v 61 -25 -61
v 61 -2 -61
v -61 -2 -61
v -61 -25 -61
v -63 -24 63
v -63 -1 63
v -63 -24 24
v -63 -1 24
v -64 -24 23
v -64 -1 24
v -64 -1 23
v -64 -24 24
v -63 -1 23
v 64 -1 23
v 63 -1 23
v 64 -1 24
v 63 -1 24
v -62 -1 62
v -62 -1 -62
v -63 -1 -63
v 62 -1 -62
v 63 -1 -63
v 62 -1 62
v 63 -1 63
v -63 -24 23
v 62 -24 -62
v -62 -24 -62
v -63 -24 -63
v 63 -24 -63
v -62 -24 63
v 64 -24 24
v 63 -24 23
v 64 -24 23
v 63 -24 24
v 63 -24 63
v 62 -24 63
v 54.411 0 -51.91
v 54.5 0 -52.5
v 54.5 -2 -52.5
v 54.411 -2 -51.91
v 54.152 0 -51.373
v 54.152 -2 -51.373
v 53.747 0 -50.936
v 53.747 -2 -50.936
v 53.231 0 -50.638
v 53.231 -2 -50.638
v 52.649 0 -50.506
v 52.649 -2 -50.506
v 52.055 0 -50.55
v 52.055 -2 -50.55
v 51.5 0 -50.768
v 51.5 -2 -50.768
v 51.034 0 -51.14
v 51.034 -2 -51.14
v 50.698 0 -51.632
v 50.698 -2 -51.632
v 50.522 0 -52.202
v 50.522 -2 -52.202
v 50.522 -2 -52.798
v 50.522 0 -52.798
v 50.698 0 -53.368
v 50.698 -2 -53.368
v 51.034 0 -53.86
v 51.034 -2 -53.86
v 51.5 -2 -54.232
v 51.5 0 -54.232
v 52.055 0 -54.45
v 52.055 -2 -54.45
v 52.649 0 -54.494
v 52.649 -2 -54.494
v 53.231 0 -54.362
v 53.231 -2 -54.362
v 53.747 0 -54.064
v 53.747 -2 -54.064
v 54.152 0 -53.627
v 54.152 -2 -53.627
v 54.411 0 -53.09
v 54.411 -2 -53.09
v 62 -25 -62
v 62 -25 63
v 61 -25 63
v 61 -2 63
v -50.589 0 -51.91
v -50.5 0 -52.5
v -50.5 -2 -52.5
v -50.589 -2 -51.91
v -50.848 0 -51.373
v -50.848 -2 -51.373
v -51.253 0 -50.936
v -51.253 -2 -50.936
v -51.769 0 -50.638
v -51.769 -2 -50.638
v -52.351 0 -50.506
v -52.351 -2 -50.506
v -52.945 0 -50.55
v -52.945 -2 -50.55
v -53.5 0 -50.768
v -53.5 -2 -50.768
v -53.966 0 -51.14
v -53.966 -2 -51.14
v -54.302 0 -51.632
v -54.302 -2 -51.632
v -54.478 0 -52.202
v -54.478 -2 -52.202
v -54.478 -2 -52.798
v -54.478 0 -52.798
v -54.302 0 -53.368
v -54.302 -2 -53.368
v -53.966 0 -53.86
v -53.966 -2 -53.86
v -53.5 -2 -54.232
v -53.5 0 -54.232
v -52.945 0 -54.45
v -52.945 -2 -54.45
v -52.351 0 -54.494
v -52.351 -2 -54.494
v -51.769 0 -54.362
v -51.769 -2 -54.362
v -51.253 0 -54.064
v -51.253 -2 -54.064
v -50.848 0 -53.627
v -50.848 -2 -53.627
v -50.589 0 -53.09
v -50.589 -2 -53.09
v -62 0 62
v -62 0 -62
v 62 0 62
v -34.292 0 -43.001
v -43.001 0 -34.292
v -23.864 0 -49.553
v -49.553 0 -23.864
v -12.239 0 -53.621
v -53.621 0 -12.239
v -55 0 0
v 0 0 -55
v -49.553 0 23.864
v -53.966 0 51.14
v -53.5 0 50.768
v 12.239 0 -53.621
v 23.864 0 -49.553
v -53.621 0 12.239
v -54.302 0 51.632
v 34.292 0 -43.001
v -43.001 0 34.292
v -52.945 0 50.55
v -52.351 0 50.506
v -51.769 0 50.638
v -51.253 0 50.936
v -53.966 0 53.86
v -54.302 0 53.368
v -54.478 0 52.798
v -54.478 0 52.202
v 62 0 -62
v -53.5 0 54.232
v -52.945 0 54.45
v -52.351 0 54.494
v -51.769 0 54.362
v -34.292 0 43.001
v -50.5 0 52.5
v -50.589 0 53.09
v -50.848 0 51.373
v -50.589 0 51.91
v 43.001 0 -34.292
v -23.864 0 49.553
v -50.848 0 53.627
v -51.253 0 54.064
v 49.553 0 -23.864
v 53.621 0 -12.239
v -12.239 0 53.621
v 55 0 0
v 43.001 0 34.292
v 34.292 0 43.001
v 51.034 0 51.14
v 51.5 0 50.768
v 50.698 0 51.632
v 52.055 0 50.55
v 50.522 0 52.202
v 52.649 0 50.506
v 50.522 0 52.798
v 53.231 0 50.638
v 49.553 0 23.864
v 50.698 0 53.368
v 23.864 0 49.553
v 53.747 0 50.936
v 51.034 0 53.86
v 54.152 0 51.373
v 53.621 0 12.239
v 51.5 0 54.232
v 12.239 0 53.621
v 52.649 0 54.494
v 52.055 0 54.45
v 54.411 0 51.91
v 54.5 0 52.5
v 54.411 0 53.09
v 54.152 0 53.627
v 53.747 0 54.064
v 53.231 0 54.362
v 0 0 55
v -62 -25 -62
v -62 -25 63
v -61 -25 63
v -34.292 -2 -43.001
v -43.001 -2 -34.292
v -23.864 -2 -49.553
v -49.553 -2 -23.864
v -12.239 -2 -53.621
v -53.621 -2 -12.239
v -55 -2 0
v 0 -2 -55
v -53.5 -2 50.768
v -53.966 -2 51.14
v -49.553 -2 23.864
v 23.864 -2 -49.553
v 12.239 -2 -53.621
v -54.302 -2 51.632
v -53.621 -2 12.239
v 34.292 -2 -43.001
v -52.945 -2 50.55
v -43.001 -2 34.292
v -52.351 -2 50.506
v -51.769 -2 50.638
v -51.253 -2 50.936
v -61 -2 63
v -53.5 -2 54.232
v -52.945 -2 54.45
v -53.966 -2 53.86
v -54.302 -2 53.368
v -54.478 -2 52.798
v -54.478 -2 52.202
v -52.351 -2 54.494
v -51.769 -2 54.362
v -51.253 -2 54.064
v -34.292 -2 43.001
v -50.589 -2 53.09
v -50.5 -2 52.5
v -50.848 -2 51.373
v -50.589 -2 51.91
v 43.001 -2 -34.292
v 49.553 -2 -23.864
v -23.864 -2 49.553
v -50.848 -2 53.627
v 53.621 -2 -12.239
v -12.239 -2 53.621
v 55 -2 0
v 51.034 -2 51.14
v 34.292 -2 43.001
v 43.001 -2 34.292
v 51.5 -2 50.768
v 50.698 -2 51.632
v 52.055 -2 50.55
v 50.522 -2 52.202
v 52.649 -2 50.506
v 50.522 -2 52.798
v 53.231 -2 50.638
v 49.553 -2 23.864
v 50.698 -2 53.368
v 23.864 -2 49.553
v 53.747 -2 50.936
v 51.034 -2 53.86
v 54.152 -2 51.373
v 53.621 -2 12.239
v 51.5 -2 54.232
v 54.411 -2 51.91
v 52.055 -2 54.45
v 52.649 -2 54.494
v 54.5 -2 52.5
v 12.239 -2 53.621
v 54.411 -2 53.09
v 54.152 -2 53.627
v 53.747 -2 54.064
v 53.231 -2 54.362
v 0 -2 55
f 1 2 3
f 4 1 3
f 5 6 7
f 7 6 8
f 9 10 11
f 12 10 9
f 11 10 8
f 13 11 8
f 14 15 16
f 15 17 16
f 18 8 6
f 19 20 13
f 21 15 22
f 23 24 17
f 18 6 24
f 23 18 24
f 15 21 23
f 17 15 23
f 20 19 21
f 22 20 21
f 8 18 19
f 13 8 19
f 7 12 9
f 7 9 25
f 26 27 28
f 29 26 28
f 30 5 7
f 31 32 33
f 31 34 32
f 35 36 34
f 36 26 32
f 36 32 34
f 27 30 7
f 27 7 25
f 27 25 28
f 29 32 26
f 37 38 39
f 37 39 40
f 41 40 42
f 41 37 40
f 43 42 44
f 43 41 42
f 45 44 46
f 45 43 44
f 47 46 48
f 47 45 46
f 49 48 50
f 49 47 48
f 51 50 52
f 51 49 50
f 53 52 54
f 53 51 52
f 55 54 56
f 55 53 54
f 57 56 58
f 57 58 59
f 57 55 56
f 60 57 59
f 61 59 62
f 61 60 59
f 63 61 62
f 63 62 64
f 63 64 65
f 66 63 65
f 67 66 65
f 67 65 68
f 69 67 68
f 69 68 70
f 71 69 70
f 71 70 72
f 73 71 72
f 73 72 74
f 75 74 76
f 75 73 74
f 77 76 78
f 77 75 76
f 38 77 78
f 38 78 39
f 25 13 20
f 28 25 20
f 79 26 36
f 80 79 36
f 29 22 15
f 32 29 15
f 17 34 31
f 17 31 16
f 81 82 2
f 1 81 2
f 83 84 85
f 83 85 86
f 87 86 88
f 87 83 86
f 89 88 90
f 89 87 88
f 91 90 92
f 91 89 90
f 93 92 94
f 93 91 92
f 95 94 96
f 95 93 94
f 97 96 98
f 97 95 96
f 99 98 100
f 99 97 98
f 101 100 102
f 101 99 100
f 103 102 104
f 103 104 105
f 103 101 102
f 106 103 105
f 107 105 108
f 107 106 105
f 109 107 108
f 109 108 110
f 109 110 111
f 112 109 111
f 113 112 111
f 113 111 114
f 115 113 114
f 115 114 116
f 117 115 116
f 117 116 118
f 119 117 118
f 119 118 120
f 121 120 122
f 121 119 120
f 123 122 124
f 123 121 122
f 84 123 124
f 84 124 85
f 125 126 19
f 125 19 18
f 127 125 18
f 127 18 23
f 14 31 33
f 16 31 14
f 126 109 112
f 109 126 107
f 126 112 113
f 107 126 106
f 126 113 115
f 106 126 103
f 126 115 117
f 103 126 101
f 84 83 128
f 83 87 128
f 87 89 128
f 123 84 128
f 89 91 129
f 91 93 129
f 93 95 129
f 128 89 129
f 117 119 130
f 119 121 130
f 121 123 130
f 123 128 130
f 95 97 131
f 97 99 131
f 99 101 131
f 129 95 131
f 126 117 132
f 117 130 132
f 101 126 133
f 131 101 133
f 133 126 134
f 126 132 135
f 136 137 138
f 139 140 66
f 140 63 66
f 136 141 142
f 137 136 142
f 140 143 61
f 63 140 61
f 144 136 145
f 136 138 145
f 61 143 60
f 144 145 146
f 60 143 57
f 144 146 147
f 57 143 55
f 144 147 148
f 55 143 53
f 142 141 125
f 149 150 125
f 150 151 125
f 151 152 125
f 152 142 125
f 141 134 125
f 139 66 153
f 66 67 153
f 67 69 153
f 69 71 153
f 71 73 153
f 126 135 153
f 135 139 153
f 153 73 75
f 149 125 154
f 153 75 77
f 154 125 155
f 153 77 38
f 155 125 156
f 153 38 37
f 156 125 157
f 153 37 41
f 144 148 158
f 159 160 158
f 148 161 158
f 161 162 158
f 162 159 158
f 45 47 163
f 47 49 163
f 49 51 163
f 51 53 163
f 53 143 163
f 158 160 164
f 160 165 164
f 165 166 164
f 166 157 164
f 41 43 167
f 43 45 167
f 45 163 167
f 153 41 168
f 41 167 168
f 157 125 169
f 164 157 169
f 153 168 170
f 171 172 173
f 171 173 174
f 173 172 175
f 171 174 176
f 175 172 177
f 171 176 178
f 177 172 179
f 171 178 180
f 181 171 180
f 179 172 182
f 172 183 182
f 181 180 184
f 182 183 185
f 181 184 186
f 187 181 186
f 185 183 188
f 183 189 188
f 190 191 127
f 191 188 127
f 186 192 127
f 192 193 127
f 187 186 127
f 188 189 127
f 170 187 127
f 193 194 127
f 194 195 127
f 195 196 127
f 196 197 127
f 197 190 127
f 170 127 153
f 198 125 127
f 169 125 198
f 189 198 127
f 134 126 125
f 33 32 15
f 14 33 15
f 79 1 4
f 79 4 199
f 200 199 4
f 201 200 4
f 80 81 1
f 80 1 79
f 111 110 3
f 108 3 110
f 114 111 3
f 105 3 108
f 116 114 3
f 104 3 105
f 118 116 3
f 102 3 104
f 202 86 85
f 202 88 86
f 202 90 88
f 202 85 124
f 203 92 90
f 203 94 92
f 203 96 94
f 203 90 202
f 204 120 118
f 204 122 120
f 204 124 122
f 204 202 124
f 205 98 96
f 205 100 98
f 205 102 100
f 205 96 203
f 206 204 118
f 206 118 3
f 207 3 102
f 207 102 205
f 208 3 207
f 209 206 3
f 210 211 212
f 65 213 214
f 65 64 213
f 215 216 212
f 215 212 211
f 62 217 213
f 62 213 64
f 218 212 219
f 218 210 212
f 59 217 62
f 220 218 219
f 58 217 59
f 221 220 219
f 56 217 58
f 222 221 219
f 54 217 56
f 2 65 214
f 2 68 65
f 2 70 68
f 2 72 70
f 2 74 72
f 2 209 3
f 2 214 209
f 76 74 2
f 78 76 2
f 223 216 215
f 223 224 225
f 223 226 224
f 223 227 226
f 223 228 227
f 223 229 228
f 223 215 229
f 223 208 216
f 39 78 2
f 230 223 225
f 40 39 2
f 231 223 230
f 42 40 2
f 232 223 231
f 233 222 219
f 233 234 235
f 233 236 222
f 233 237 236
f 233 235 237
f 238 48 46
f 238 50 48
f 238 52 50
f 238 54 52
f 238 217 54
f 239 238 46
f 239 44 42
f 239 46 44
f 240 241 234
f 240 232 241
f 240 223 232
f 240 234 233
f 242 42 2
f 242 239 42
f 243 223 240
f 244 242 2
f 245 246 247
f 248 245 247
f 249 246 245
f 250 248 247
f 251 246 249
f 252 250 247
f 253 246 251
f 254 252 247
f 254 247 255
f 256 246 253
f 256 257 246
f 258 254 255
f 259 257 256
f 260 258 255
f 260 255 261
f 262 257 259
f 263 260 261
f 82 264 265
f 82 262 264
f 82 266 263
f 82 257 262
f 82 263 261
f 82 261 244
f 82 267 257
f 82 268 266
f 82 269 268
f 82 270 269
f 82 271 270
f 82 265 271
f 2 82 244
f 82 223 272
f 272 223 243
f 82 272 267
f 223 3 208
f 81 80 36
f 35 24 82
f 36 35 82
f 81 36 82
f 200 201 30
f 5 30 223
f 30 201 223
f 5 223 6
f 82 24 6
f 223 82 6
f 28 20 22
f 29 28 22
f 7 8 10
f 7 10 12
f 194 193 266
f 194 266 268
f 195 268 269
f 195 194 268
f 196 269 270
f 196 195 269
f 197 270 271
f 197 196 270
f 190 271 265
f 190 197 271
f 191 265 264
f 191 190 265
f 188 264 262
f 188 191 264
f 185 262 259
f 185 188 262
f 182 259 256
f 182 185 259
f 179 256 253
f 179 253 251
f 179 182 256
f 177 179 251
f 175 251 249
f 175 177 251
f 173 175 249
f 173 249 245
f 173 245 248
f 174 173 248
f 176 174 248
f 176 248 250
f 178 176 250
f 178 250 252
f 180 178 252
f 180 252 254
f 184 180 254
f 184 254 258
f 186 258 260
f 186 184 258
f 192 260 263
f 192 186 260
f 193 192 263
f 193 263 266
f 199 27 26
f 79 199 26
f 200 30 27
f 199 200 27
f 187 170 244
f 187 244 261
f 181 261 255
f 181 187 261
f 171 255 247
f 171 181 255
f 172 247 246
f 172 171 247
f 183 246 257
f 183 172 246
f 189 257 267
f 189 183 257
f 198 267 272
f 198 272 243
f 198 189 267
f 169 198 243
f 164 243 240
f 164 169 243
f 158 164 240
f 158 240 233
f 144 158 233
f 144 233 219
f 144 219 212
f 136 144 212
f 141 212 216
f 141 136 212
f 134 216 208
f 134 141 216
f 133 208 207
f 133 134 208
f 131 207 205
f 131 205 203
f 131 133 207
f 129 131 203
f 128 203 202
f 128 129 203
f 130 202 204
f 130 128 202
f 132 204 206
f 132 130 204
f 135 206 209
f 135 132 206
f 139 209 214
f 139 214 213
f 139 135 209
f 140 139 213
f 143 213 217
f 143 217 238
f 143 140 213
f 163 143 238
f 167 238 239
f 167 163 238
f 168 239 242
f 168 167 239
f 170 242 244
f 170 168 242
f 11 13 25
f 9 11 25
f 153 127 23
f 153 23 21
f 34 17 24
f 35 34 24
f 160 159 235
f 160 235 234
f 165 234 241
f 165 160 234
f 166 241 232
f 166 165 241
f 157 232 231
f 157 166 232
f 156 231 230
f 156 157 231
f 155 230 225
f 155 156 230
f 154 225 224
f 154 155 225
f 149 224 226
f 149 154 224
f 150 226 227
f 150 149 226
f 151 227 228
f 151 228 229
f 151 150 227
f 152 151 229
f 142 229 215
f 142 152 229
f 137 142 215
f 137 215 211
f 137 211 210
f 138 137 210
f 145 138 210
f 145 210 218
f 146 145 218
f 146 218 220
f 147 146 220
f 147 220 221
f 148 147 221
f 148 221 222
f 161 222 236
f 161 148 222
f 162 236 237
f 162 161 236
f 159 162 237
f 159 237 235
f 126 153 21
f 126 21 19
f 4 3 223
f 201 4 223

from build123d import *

# Parameters (mm, degrees)
F0_W     = 122
F0_H     = 122
F0_R     = 2
F0_R_2   = 55
F0_H_2   = 1
F1_DEPTH = 2
F0_W_2   = 1
F2_DEPTH = 25
F3_DEPTH = 24
F4_DEPTH = 1
F5_W     = 23
F5_H     = 1
F6_DEPTH = 1
F7_W     = 23
F7_H     = 1
F8_DEPTH = 1


with BuildPart() as f1:
    # F0 (on Front) → F1 (new body)
    with BuildSketch(Plane.XZ):
        Rectangle(F0_W, F0_H)
        with Locations((-52.5, -52.5)):
            Circle(F0_R, mode=Mode.SUBTRACT)
        with Locations((52.5, -52.5)):
            Circle(F0_R, mode=Mode.SUBTRACT)
        with Locations((-52.5, 52.5)):
            Circle(F0_R, mode=Mode.SUBTRACT)
        Circle(F0_R_2, mode=Mode.SUBTRACT)
        with Locations((52.5, 52.5)):
            Circle(F0_R, mode=Mode.SUBTRACT)
        with Locations((0, 61.5)):
            Rectangle(F0_W, F0_H_2)
        with Locations((0, 62.5)):
            Rectangle(F0_W, F0_H_2)
    extrude(amount=F1_DEPTH)

    # F0 (on Front) → F2 (join)
    with BuildSketch(Plane.XZ):
        Polygon((61, 61), (61, -61), (-61, -61), (-61, 61), (-61, 62), (-62, 62), (-62, -62), (62, -62), (62, 62), (61, 62), align=None)
        with Locations((61.5, 62.5)):
            Rectangle(F0_W_2, F0_H_2)
        with Locations((-61.5, 62.5)):
            Rectangle(F0_W_2, F0_H_2)
    extrude(amount=F2_DEPTH)

    # F0 (on Front) → F3 (join)
    with BuildSketch(Plane.XZ):
        Polygon((62, 63), (62, 62), (62, -62), (-62, -62), (-62, 62), (-62, 63), (-63, 63), (-63, -63), (63, -63), (63, 63), align=None)
    extrude(amount=F3_DEPTH)

    # F0 (on Front) → F4 (cut)
    with BuildSketch(Plane.XZ):
        Polygon((62, 63), (62, 62), (62, -62), (-62, -62), (-62, 62), (-62, 63), (-63, 63), (-63, -63), (63, -63), (63, 63), align=None)
        with Locations((61.5, 62.5)):
            Rectangle(F0_W_2, F0_H_2)
        with Locations((0, 62.5)):
            Rectangle(F0_W, F0_H_2)
        with Locations((-61.5, 62.5)):
            Rectangle(F0_W_2, F0_H_2)
    extrude(amount=F4_DEPTH, mode=Mode.SUBTRACT)

    # F5 (on face) → F6 (join)
    with BuildSketch(Plane(origin=(-63, 0, 0), x_dir=(0, -1, 0), z_dir=(-1, 0, 0))):
        with Locations((12.5, 23.5)):
            Rectangle(F5_W, F5_H)
    extrude(amount=F6_DEPTH)

    # F7 (on face) → F8 (join)
    with BuildSketch(Plane.YZ.offset(63)):
        with Locations((-12.5, 23.5)):
            Rectangle(F7_W, F7_H)
    extrude(amount=F8_DEPTH)


solid = f1.part
